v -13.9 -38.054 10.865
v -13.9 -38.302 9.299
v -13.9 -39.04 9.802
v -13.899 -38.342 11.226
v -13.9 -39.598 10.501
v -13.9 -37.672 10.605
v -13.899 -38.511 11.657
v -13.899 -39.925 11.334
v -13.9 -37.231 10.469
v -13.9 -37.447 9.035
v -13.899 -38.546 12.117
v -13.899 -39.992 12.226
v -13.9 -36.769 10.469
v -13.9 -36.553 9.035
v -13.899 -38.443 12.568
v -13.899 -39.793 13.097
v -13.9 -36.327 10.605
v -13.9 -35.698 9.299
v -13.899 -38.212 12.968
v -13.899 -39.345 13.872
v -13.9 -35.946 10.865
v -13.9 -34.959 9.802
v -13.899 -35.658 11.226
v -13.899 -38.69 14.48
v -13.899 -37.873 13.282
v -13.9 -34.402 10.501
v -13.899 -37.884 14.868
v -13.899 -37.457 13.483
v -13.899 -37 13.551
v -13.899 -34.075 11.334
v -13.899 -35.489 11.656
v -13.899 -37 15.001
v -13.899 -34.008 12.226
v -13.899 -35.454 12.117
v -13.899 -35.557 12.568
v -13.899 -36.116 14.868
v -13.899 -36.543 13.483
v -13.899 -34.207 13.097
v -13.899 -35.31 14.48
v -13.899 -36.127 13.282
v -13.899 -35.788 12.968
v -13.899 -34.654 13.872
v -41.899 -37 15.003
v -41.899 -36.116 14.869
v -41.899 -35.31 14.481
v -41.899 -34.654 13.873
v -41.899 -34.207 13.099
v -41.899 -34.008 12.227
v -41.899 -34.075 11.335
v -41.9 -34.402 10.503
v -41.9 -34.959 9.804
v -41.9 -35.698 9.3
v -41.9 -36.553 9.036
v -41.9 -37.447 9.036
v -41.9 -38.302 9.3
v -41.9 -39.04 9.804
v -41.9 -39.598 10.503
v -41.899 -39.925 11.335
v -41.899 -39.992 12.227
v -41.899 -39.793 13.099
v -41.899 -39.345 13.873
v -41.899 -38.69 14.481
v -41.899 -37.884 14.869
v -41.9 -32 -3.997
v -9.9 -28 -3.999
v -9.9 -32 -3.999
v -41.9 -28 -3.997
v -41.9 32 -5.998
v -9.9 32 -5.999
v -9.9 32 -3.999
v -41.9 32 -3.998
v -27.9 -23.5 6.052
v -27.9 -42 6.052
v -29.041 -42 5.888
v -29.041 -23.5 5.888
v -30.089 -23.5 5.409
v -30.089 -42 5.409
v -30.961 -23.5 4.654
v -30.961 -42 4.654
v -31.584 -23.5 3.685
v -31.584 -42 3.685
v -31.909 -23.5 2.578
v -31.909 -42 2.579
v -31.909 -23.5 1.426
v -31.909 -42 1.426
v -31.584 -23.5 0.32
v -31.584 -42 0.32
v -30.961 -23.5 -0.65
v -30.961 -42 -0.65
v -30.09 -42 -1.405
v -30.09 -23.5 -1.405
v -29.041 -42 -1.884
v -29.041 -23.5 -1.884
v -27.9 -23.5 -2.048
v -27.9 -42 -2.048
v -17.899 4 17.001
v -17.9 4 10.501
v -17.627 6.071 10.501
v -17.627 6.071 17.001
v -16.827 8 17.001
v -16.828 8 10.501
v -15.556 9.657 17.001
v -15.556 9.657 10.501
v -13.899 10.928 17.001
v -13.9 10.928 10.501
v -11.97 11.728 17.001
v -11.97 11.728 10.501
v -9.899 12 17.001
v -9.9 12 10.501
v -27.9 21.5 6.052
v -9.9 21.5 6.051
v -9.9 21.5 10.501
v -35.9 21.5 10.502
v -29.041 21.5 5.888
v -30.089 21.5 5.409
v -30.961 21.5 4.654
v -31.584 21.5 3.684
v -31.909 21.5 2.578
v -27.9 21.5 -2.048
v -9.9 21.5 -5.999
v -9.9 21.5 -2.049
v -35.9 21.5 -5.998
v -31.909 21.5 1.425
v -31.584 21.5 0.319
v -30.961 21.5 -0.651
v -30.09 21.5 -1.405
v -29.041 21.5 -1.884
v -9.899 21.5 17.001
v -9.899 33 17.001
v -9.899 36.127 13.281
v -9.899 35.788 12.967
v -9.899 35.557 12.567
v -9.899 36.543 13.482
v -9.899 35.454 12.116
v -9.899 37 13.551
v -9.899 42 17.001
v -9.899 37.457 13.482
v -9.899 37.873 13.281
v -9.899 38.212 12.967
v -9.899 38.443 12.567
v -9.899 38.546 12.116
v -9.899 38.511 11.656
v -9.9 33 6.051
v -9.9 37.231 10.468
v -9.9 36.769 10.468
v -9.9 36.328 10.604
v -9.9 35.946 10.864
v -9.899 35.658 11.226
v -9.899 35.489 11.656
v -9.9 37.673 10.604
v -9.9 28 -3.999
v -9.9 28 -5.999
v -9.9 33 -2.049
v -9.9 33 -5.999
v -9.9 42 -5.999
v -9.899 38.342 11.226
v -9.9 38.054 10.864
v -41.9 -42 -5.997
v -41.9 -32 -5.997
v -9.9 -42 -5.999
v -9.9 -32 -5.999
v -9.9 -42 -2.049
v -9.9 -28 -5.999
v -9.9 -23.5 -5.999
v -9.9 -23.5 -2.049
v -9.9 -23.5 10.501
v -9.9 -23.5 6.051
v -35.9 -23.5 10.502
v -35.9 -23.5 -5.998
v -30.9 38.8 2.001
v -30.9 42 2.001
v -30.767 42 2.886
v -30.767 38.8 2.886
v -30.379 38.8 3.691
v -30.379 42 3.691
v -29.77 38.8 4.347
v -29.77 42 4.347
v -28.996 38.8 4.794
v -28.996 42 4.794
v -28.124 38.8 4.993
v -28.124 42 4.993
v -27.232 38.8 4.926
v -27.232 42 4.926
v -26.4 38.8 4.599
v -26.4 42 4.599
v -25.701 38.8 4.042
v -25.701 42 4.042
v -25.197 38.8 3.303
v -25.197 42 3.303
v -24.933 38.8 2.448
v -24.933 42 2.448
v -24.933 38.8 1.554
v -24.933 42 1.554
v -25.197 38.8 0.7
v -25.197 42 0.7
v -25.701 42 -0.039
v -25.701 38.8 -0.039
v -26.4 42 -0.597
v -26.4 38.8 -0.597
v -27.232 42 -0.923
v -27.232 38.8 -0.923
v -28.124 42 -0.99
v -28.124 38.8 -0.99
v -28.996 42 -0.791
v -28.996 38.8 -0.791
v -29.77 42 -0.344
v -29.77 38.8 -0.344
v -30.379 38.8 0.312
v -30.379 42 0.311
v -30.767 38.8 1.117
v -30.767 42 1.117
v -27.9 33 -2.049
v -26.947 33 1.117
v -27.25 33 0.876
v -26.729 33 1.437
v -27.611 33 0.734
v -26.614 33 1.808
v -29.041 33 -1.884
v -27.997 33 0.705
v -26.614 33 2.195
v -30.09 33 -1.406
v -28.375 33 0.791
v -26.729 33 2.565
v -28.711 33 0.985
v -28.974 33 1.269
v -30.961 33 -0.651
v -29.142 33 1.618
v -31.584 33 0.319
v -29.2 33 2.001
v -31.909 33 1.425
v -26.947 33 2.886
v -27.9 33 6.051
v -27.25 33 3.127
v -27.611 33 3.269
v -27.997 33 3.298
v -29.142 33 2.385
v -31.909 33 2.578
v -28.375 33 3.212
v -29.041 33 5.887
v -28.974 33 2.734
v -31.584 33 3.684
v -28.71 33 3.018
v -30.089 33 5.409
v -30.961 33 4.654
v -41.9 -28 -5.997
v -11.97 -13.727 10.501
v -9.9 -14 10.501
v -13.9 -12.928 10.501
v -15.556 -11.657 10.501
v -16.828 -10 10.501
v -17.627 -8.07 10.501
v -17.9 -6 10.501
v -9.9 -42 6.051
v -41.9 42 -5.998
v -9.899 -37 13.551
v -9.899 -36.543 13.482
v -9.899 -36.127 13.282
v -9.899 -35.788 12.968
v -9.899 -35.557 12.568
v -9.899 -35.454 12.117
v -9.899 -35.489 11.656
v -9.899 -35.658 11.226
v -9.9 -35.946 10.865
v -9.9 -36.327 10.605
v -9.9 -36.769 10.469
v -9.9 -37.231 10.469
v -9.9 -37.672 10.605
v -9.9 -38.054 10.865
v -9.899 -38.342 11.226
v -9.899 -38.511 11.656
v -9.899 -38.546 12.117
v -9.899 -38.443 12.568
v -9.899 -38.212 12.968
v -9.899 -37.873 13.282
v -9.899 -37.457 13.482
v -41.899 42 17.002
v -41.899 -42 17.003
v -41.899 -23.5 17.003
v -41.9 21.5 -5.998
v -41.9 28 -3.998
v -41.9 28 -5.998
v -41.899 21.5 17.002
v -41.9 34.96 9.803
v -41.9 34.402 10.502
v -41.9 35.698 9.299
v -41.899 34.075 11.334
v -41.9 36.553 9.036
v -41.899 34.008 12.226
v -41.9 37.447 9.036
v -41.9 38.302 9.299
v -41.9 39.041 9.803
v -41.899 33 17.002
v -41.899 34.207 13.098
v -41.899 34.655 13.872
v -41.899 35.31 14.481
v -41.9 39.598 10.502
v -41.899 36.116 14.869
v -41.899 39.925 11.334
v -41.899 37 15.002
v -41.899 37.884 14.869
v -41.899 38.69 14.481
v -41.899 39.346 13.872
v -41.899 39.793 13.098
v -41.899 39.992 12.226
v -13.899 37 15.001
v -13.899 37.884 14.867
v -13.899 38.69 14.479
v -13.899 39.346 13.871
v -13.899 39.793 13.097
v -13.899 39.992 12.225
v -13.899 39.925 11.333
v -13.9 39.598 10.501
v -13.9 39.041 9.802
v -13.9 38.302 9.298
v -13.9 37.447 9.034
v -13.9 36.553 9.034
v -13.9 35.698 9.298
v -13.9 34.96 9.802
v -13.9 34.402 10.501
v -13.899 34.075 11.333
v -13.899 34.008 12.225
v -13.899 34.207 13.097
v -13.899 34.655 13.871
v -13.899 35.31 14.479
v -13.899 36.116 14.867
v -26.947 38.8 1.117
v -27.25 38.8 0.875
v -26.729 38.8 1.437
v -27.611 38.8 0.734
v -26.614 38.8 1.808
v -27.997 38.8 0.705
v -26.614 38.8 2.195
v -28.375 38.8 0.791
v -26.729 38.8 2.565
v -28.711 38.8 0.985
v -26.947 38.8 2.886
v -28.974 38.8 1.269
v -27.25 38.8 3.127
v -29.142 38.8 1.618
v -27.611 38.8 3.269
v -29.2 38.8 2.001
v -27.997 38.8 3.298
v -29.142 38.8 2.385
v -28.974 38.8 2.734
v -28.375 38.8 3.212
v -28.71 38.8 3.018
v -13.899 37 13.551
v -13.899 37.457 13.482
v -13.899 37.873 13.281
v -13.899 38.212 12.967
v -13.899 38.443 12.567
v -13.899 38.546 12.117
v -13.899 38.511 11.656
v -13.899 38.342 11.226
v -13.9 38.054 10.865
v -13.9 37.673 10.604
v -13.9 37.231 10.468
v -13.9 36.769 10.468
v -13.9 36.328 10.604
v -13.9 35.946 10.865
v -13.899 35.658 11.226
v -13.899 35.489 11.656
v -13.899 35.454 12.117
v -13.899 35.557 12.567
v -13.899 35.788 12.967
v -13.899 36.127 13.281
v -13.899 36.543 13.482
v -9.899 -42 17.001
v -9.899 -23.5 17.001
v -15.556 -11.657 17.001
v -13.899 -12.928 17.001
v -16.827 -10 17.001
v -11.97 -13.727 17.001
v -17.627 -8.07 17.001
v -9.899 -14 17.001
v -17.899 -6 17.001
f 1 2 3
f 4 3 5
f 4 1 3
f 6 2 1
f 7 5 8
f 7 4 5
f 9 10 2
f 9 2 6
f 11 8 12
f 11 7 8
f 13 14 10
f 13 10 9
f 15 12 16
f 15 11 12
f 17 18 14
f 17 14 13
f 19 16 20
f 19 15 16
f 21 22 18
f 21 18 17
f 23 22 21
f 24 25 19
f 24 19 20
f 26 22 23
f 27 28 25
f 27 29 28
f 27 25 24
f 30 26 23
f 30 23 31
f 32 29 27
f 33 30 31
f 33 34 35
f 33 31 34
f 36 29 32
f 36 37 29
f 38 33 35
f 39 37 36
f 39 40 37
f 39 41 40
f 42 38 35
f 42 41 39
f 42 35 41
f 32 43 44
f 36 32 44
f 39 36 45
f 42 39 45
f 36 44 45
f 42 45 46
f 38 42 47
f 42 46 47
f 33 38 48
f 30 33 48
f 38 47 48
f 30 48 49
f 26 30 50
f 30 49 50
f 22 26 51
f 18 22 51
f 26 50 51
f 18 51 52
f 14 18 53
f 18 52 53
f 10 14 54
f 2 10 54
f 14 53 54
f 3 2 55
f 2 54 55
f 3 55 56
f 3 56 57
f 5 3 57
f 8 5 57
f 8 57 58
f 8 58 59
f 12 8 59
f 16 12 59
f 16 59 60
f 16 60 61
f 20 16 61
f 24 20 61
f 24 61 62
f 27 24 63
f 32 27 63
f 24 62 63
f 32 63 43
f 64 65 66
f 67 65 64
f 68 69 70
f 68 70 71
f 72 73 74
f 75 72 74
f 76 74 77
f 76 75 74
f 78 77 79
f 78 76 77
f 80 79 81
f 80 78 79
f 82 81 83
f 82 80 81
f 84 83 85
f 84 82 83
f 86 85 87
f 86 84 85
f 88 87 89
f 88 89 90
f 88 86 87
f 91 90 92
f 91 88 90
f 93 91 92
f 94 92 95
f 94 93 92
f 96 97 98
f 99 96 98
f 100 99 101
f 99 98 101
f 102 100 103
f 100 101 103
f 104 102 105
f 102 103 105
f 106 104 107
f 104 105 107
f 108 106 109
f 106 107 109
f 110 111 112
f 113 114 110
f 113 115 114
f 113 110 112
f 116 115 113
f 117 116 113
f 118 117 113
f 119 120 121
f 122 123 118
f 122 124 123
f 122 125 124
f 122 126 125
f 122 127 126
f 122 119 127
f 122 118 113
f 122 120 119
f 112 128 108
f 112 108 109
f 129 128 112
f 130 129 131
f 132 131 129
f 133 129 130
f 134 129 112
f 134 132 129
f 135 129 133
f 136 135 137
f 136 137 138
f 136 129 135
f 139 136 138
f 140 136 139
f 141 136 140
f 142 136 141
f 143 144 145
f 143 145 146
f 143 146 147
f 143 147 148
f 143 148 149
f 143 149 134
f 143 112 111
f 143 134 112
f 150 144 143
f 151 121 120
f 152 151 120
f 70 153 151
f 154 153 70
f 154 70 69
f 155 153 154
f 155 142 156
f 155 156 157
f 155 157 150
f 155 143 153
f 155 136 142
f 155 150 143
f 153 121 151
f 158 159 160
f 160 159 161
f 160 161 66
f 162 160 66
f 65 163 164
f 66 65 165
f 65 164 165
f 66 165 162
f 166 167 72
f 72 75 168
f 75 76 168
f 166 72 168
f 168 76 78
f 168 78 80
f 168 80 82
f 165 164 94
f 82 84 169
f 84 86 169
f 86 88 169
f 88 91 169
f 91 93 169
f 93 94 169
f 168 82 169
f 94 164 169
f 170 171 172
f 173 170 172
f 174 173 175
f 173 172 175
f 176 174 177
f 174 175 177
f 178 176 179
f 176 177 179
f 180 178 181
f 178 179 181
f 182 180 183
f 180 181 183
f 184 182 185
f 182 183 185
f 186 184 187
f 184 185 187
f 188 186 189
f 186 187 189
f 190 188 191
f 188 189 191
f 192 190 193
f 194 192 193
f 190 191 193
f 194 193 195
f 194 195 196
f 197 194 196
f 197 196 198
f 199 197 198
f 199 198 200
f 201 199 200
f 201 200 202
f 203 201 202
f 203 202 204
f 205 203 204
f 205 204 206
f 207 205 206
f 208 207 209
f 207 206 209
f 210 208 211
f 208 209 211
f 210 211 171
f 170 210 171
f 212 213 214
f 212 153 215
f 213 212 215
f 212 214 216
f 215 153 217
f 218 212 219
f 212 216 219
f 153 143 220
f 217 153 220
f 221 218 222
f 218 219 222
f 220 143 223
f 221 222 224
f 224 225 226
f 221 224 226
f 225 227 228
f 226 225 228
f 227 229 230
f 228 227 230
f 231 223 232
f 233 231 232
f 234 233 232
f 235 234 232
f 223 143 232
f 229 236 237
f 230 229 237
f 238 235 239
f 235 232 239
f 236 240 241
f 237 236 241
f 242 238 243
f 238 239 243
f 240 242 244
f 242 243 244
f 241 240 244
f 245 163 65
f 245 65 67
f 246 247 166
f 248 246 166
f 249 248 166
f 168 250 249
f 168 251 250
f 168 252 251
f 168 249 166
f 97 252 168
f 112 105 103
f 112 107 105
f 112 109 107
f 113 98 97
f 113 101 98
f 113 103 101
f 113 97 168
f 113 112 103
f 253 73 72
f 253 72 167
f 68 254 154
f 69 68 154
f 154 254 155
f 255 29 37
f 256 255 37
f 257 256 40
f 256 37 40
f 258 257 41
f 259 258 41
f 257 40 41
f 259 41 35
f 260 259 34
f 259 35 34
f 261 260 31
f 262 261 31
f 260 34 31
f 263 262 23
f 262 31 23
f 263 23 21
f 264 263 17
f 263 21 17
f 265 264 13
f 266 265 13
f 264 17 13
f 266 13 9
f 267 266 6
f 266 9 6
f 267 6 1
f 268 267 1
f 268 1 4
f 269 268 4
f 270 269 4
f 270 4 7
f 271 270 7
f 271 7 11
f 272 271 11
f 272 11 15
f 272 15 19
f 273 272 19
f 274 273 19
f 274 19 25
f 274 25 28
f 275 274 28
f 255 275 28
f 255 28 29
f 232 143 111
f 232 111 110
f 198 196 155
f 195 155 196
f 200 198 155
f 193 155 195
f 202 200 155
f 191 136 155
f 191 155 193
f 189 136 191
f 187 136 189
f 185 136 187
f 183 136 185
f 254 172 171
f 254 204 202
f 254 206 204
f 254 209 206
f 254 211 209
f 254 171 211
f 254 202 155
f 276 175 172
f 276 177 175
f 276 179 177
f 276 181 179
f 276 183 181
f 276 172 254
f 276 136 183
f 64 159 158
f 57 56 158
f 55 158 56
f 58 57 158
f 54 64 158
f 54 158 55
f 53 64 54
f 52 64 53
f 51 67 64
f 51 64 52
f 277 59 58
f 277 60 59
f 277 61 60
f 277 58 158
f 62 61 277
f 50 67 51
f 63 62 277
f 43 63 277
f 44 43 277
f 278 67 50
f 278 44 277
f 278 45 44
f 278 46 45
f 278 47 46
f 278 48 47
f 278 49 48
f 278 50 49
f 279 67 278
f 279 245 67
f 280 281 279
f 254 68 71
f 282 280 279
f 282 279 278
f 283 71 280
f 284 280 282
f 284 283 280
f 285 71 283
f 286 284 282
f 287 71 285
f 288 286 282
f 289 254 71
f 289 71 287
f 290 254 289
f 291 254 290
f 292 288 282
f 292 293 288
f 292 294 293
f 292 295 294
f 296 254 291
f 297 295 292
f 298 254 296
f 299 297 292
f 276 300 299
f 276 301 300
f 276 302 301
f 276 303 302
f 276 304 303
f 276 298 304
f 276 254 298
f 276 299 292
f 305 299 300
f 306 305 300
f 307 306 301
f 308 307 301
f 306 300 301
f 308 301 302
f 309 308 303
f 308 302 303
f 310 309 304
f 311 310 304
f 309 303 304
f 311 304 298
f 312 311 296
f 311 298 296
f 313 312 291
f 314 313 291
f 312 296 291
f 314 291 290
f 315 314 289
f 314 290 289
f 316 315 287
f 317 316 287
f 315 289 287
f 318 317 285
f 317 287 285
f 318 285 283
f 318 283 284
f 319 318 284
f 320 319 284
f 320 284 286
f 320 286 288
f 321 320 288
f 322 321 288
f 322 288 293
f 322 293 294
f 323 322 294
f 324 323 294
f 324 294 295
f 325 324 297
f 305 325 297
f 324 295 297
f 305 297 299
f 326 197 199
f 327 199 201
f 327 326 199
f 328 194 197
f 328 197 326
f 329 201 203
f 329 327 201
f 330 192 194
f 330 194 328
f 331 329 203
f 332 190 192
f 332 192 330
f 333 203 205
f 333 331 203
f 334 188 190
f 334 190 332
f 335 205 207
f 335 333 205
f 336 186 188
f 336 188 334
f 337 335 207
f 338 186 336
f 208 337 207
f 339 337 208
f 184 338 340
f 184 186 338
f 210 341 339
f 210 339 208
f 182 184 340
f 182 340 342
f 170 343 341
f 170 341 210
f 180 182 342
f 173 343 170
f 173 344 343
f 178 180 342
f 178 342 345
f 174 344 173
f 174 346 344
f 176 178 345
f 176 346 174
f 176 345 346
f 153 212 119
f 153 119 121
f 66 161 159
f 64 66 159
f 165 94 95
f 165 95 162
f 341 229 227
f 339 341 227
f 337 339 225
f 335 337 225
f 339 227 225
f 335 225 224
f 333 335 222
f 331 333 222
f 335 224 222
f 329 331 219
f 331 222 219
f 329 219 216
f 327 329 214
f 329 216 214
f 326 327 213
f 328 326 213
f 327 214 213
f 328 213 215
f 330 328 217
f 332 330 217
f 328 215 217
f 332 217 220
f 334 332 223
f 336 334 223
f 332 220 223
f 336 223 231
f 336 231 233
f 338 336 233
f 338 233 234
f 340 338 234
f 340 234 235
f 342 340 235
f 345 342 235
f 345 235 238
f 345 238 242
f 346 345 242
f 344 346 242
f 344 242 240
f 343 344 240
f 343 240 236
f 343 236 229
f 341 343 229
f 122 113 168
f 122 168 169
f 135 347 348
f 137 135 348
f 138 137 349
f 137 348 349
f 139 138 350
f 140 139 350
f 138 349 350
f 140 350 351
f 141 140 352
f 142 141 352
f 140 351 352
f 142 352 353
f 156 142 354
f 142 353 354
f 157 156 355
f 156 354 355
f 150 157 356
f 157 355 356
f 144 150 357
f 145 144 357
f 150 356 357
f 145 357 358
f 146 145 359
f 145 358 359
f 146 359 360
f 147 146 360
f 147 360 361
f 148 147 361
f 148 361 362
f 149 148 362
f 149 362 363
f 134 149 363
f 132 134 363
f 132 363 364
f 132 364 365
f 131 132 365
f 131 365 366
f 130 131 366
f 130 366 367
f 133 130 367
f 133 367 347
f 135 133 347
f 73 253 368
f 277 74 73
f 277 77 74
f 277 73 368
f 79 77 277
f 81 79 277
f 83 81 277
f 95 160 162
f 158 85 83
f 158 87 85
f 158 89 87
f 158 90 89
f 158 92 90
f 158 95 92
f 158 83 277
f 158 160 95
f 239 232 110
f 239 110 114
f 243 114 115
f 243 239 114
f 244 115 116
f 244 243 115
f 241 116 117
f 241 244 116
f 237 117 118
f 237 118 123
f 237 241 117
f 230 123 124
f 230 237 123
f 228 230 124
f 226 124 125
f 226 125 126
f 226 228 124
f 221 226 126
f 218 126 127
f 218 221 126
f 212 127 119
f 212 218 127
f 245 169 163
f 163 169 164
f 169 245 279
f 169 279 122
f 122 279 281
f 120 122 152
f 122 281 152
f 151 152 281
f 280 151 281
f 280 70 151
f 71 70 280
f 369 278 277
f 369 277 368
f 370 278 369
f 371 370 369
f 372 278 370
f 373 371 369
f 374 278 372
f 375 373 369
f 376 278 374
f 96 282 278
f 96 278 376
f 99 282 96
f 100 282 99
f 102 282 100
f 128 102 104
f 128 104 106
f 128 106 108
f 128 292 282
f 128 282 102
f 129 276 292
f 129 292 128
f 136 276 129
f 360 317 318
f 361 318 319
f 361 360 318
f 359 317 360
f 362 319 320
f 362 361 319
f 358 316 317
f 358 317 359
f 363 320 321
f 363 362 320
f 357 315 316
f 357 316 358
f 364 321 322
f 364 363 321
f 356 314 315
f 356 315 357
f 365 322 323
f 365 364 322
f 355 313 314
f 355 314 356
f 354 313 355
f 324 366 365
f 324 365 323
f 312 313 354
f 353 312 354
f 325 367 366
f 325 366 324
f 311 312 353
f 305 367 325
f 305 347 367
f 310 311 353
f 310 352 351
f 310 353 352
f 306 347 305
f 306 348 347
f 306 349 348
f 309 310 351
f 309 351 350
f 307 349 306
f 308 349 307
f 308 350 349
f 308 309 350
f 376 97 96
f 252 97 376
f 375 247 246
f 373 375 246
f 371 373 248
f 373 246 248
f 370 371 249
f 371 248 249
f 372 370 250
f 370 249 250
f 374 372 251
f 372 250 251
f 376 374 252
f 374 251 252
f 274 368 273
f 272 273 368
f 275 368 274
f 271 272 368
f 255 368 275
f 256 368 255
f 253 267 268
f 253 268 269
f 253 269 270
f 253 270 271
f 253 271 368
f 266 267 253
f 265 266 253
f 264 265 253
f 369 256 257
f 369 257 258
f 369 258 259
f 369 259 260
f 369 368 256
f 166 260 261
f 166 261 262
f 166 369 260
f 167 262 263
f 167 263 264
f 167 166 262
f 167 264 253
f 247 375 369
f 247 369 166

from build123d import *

# Parameters (mm, degrees)
SKETCH014_W     = 32
SKETCH014_H     = 23
PAD010_DEPTH    = 9
PAD011_DEPTH    = 11.5
SKETCH016_W     = 6
SKETCH016_H     = 23
PAD012_DEPTH    = 45
SKETCH017_W     = 26
SKETCH017_H     = 6.5
PAD013_DEPTH    = 45
PAD014_DEPTH    = 18.5
POCKET004_DEPTH = 7
SKETCH020_R     = 1.55
POCKET005_DEPTH = 32.0020324037
SKETCH023_W     = 32
SKETCH023_H     = 4
POCKET008_DEPTH = 2
SKETCH031_R     = 3
POCKET015_DEPTH = 28
SKETCH032_R     = 1.3
POCKET016_DEPTH = 9.0012093656
SKETCH033_R     = 3
POCKET017_DEPTH = 3.2


with BuildPart() as part:
    # Sketch014 (on DatumPlane) → Pad010 (new body)
    with BuildSketch(Plane(origin=(0.0002244487, 42.0000455139, 5.000075686), x_dir=(-0.999999999, 4e-10, 4.48856e-05), z_dir=(0, 1, -9.1023e-06))):
        with Locations((25.9, 0.5)):
            Rectangle(SKETCH014_W, SKETCH014_H)
    extrude(amount=-PAD010_DEPTH)

    # Sketch015 (on Face6 of Pad010) → Pad011 (join)
    with BuildSketch(Plane(origin=(0.0002244487, 33.0000455142, 5.0001576066), x_dir=(-0.999999999, 4e-10, 4.48856e-05), z_dir=(0, -1, 9.1023e-06))):
        with BuildLine():
            Line((41.9, 11), (9.9, 11))
            Line((9.9, 7.05), (9.9, 11))
            Line((27.9, 7.05), (9.9, 7.05))
            ThreePointArc((27.9, -1.05), (31.9500075634, 3), (27.9, 7.05))
            Line((9.9, -1.05), (27.9, -1.05))
            Line((9.9, -1.05), (9.9, -12))
            Line((41.9, -12), (9.9, -12))
            Line((41.9, 11), (41.9, -12))
        make_face()
    extrude(amount=PAD011_DEPTH)

    # Sketch016 (on Face3 of Pad011) → Pad012 (join)
    with BuildSketch(Plane(origin=(0.0002244487, 21.5000455147, 5.0002622829), x_dir=(-0.999999999, 4e-10, 4.48856e-05), z_dir=(0, -1, 9.1023e-06))):
        with Locations((38.9, -0.5)):
            Rectangle(SKETCH016_W, SKETCH016_H)
    extrude(amount=PAD012_DEPTH)

    # Sketch017 (on Face6 of Pad012) → Pad013 (join)
    with BuildSketch(Plane(origin=(0.0002244487, 21.5000455147, 5.0002622829), x_dir=(-0.999999999, 4e-10, 4.48856e-05), z_dir=(0, -1, 9.1023e-06))):
        with Locations((22.9, -8.75)):
            Rectangle(SKETCH017_W, SKETCH017_H)
    extrude(amount=PAD013_DEPTH)

    # Sketch018 (on Face13 of Pad013) → Pad014 (join)
    with BuildSketch(Plane(origin=(0.0002244487, -23.4999544834, 5.0006718856), x_dir=(-0.999999999, 4e-10, 4.48856e-05), z_dir=(0, -1, 9.1023e-06))):
        with BuildLine():
            Line((41.9, 11), (9.9, 11))
            Line((9.9, 11), (9.9, 7.05))
            Line((27.9, 7.05), (9.9, 7.05))
            ThreePointArc((27.9, -1.05), (31.9500081085, 3), (27.9, 7.05))
            Line((27.9, -1.05), (9.9, -1.05))
            Line((9.9, -1.05), (9.9, -12))
            Line((41.9, -12), (9.9, -12))
            Line((41.9, 11), (41.9, -12))
        make_face()
    extrude(amount=PAD014_DEPTH)

    # Sketch019 (on Face8 of Pad014) → Pocket004 (cut)
    with BuildSketch(Plane(origin=(0.0004713196, 42.0000955764, 10.5000756803), x_dir=(-0.999999999, 4e-10, 4.48856e-05), z_dir=(-4.48856e-05, -9.1023e-06, -0.999999999))):
        with BuildLine():
            ThreePointArc((17.9, -38), (9.9, -30), (1.9, -38))
            Line((1.9, -38), (1.9, -48))
            ThreePointArc((1.9, -48), (9.9, -56), (17.9, -48))
            Line((17.9, -38), (17.9, -48))
        make_face()
    extrude(amount=-POCKET004_DEPTH, mode=Mode.SUBTRACT)

    # Sketch020 (on Face13 of Pocket004) → Pocket005 (cut, through all)
    with BuildSketch(Plane(origin=(-41.8997755091, 42.000045531, 5.0019563937), x_dir=(4.48856e-05, 9.1023e-06, 0.999999999), z_dir=(-0.999999999, 4e-10, 4.48856e-05))):
        with Locations((7, -5)):
            Circle(SKETCH020_R)
        with Locations((7, -79)):
            Circle(SKETCH020_R)
    extrude(amount=-POCKET005_DEPTH, mode=Mode.SUBTRACT)

    # Sketch023 (on Face12 of Pocket005) → Pocket008 (cut)
    with BuildSketch(Plane(origin=(-0.0002692932, 41.9999453887, -5.9999243024), x_dir=(-0.999999999, 4e-10, 4.48856e-05), z_dir=(-4.48856e-05, -9.1023e-06, -0.999999999))):
        with Locations((25.9, -12)):
            Rectangle(SKETCH023_W, SKETCH023_H)
        with Locations((25.9, -72)):
            Rectangle(SKETCH023_W, SKETCH023_H)
    extrude(amount=-POCKET008_DEPTH, mode=Mode.SUBTRACT)

    # Sketch031 (on Face14 of Pocket008) → Pocket015 (cut)
    with BuildSketch(Plane(origin=(-41.8997755091, 42.000045531, 5.0019563937), x_dir=(4.48856e-05, 9.1023e-06, 0.999999999), z_dir=(-0.999999999, 4e-10, 4.48856e-05))):
        with Locations((7, -5)):
            Circle(SKETCH031_R)
        with Locations((7, -79)):
            Circle(SKETCH031_R)
    extrude(amount=-POCKET015_DEPTH, mode=Mode.SUBTRACT)

    # Sketch032 (on Face32 of Pocket015) → Pocket016 (cut, through all)
    with BuildSketch(Plane(origin=(0.0002244487, 33.0000455142, 5.0001576066), x_dir=(-0.999999999, 4e-10, 4.48856e-05), z_dir=(0, -1, 9.1023e-06))):
        with Locations((27.900008, 3)):
            Circle(SKETCH032_R)
    extrude(amount=-POCKET016_DEPTH, mode=Mode.SUBTRACT)

    # Sketch033 (on Face17 of Pocket016) → Pocket017 (cut)
    with BuildSketch(Plane(origin=(0.0002244487, 42.0000455139, 5.0000756861), x_dir=(-0.999999999, 4e-10, 4.48856e-05), z_dir=(0, 1, -9.1023e-06))):
        with Locations((27.900008, -3)):
            Circle(SKETCH033_R)
    extrude(amount=-POCKET017_DEPTH, mode=Mode.SUBTRACT)


solid = part.part
